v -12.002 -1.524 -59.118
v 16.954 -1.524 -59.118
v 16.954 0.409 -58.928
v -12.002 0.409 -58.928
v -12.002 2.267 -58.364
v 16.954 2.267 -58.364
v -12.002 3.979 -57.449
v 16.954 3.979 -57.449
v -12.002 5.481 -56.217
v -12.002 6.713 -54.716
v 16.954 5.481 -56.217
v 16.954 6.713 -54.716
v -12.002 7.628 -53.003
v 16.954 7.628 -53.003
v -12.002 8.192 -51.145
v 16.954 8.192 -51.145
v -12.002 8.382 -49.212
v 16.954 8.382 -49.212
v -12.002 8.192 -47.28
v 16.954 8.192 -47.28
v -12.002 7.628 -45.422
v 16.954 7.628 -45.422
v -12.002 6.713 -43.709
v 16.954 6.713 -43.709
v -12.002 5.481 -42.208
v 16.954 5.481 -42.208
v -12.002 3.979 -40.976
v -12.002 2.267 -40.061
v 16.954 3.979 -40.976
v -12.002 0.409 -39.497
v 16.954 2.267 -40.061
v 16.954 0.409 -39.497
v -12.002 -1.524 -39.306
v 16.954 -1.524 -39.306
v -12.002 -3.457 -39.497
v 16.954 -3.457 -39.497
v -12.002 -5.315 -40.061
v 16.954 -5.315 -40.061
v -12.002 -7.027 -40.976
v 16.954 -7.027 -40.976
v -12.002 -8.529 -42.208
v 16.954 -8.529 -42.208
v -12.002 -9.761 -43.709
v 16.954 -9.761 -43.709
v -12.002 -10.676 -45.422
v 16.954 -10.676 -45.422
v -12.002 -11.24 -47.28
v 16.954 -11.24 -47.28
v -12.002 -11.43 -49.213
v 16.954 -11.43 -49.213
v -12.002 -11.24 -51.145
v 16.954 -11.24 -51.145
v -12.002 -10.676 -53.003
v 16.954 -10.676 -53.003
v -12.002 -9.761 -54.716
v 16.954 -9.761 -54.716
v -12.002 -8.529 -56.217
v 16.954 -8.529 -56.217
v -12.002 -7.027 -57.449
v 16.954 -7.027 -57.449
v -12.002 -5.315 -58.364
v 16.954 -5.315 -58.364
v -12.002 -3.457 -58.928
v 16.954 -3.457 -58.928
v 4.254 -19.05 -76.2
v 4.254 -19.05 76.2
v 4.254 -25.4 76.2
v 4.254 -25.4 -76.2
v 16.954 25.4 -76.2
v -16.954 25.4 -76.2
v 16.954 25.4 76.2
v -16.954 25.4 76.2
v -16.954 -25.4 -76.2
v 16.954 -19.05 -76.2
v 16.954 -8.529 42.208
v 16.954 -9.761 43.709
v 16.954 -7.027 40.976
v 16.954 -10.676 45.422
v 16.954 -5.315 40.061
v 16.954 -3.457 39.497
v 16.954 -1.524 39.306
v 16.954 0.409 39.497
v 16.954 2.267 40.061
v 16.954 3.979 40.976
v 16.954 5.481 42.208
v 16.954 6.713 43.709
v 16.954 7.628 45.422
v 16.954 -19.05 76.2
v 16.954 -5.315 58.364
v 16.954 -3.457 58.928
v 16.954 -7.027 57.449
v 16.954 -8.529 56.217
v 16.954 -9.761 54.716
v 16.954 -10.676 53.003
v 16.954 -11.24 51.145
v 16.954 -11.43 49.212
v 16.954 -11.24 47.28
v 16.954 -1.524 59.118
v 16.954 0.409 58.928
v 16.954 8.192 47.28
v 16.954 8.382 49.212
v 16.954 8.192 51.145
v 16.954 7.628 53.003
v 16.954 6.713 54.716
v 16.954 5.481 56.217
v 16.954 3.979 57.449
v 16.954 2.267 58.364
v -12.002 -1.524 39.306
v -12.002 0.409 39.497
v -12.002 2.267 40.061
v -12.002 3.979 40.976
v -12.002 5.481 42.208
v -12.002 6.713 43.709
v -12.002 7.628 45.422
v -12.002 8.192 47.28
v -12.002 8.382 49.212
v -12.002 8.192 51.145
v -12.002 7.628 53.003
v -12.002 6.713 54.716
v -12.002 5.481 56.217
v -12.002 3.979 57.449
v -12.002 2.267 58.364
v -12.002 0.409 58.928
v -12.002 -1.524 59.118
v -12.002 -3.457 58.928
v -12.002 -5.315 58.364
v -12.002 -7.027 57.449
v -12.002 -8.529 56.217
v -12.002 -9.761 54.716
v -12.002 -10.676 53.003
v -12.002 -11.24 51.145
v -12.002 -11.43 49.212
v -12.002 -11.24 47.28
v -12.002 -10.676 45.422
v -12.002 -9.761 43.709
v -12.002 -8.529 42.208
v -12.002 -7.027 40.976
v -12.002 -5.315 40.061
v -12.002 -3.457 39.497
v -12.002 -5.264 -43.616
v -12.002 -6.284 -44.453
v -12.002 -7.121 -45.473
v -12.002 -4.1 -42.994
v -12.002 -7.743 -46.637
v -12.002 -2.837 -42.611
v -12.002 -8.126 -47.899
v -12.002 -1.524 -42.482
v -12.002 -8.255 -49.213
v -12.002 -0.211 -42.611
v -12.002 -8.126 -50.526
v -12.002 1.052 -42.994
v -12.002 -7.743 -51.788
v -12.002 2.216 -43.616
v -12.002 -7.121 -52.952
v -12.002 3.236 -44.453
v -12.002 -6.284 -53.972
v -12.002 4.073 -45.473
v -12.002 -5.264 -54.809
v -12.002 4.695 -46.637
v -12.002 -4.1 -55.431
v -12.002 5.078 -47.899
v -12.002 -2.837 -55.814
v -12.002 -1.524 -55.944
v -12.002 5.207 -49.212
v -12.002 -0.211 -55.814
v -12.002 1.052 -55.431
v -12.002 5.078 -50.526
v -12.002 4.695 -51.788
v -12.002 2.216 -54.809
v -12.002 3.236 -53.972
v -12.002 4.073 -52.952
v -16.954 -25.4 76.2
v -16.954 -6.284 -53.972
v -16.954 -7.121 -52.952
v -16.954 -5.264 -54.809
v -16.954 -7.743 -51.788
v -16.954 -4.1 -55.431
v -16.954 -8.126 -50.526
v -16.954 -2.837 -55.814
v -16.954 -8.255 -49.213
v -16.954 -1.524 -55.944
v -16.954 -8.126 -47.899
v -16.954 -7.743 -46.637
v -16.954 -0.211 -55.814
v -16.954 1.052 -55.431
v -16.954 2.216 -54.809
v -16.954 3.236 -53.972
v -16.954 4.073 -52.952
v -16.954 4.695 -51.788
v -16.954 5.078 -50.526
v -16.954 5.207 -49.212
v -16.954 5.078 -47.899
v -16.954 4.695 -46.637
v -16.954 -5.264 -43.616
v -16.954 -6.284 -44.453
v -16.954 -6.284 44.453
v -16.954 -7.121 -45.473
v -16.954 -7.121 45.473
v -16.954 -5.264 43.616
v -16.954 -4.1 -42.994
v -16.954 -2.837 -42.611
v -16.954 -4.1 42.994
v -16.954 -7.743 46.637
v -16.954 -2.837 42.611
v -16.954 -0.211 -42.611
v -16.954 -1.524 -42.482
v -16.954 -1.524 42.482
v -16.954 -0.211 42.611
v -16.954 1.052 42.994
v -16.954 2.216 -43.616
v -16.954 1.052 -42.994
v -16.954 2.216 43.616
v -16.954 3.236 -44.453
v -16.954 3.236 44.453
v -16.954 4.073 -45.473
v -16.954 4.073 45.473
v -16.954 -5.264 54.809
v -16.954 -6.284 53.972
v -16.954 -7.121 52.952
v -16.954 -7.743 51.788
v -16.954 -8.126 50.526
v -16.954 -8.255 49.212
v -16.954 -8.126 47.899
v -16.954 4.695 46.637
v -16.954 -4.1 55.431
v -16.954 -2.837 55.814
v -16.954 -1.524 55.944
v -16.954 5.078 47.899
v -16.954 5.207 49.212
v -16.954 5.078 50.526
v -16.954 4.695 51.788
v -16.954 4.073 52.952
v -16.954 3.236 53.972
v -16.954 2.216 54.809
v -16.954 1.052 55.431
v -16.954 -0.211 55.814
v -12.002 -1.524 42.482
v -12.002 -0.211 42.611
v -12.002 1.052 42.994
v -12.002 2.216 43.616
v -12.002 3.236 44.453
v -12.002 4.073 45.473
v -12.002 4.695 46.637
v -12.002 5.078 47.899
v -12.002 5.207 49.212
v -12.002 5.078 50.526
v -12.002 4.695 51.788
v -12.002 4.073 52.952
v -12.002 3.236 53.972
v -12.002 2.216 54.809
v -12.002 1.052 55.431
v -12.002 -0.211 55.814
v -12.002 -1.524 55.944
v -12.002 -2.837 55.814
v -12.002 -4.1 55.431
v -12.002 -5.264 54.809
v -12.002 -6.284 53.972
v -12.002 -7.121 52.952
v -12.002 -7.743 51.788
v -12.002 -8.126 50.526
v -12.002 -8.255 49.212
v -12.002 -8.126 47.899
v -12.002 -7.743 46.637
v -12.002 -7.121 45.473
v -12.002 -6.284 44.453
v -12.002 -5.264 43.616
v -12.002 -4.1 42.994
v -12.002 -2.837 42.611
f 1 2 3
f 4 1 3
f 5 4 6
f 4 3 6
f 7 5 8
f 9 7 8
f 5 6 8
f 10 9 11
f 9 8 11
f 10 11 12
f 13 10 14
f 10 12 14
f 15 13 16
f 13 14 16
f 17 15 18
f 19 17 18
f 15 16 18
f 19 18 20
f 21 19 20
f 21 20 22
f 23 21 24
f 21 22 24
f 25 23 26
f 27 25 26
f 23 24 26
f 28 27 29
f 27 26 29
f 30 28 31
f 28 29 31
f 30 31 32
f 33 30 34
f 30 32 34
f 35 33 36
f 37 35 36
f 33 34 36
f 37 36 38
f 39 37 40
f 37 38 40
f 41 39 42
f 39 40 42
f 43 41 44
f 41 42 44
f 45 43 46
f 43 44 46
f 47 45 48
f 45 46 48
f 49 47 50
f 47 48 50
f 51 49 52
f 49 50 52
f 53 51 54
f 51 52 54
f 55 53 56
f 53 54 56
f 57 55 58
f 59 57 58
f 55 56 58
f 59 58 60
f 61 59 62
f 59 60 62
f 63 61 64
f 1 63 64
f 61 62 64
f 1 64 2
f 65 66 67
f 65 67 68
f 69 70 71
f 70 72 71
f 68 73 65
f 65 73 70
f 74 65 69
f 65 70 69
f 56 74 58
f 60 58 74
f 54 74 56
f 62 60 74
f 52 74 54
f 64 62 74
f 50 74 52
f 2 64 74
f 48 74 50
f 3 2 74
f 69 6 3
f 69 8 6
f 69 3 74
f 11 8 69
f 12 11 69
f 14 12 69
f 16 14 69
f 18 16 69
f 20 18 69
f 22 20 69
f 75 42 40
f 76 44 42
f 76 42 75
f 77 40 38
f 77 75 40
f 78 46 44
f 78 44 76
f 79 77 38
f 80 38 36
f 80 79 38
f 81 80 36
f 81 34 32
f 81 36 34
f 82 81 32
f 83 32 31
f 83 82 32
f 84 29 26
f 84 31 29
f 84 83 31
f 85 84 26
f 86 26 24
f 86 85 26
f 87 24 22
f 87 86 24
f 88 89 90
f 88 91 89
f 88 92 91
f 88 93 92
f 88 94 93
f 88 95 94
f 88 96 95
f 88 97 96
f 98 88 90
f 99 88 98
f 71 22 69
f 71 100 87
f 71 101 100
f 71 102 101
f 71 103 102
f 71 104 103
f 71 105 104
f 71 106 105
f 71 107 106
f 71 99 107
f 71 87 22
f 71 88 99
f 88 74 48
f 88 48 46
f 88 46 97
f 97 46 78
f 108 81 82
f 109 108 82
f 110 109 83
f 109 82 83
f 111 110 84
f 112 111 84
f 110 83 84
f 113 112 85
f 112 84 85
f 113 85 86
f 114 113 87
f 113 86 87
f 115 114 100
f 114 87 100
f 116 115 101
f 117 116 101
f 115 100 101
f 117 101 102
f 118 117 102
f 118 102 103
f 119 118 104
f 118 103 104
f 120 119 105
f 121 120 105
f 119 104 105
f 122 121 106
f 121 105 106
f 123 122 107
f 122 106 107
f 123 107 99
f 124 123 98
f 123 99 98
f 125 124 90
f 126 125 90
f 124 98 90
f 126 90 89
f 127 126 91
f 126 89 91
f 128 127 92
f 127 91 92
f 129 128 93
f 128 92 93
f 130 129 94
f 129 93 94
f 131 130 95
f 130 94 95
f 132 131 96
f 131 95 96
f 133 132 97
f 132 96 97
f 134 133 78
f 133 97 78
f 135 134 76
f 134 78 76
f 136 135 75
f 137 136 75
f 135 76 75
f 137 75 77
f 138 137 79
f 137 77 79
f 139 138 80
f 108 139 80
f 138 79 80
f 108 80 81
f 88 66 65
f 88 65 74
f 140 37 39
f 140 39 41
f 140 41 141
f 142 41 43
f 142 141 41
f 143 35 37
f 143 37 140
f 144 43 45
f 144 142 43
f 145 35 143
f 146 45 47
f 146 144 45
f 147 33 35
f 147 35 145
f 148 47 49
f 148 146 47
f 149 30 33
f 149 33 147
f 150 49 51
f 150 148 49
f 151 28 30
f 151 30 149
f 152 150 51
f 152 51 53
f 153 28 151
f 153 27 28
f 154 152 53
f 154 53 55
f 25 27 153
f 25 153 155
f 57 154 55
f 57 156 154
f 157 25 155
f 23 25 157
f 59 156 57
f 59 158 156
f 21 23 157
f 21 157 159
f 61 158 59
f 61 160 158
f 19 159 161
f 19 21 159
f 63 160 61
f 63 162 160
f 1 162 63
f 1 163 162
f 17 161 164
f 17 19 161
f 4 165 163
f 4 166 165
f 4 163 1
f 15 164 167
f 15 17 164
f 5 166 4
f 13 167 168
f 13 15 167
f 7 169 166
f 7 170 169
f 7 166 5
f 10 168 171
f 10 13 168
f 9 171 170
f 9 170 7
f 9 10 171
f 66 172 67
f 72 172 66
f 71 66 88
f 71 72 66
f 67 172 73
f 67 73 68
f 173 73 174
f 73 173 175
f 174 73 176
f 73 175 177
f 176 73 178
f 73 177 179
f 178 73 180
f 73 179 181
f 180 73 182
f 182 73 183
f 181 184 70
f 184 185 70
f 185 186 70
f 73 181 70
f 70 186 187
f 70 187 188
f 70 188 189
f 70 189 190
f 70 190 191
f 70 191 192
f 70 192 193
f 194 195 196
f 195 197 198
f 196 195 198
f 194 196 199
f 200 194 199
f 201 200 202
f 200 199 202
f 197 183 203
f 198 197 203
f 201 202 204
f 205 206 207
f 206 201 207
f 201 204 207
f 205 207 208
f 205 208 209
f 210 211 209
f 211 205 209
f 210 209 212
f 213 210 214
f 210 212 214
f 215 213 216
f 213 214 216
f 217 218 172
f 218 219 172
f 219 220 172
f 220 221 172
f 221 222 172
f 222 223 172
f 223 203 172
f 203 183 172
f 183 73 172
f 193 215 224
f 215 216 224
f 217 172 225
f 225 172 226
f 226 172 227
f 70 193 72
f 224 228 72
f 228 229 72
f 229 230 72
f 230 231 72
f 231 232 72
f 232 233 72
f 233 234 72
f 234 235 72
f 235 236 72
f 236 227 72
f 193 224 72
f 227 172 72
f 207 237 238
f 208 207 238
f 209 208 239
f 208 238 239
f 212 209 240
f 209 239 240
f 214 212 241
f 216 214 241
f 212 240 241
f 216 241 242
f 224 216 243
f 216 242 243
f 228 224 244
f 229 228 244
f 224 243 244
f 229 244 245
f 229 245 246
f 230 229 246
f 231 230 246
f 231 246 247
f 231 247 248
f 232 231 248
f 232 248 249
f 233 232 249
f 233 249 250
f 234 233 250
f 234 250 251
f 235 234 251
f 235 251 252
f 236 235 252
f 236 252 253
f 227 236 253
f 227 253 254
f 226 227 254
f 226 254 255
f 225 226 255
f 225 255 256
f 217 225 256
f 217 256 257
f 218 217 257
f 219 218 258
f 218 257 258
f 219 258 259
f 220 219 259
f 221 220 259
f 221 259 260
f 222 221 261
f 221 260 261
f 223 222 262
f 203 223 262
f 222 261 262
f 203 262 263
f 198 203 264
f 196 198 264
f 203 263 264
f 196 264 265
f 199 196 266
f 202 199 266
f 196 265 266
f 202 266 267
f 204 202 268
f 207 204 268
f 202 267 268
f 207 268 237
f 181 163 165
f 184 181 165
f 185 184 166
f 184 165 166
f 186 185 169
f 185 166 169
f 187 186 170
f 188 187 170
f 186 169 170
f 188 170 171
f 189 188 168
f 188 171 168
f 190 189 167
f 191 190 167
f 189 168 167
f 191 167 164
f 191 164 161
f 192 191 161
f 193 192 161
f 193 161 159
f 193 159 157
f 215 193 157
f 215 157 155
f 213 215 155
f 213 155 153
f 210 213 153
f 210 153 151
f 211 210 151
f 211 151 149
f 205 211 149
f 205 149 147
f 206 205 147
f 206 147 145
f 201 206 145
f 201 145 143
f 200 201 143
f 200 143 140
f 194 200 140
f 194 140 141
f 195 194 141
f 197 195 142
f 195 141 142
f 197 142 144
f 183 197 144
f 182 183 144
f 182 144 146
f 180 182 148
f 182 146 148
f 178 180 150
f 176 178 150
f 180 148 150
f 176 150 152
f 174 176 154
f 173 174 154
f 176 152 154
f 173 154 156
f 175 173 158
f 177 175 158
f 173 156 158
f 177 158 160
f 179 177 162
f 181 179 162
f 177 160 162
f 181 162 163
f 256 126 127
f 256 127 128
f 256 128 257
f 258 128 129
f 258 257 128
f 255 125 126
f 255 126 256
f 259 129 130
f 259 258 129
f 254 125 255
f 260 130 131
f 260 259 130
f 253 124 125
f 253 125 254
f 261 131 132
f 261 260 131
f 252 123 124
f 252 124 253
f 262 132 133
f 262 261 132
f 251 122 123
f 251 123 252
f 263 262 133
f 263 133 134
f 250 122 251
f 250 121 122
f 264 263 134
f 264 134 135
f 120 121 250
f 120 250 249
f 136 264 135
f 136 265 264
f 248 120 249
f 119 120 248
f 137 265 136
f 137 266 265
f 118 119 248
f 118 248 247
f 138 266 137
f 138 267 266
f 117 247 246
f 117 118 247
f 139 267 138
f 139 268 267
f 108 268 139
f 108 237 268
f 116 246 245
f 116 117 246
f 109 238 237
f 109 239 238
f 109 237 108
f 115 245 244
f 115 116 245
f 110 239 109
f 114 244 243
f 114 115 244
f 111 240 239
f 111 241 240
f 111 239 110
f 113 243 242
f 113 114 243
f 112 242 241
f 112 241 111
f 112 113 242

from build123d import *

# Parameters (mm, degrees)
SKETCH1_W           = 33.909
SKETCH1_H           = 50.8
BOSS_EXTRUDE1_DEPTH = 76.2
CUT_EXTRUDE1_REACH  = 89.186
SKETCH2_R           = 6.731
SKETCH3_R           = 9.906
CUT_EXTRUDE2_DEPTH  = 28.956
SKETCH4_W           = 4.494494968
SKETCH4_H           = 6.35
CUT_EXTRUDE4_DEPTH  = 156.42964669
SKETCH5_W           = 152.4
SKETCH5_H           = 6.35
CUT_EXTRUDE5_DEPTH  = 12.7


with BuildPart() as part:
    # Sketch1 → Boss-Extrude1 (new, symmetric)
    with BuildSketch(Plane.XY):
        Rectangle(SKETCH1_W, SKETCH1_H)
    extrude(amount=BOSS_EXTRUDE1_DEPTH, both=True)

    # Sketch2 → Cut-Extrude1 (cut, up to next)
    with BuildSketch(Plane(origin=(16.9545, 0, 0), x_dir=(0, 0, -1), z_dir=(1, 0, 0)), mode=Mode.PRIVATE) as cut_extrude1_sk1:
        with Locations((-49.2125, -1.524)):
            Circle(SKETCH2_R)
    cut_extrude1_tool1 = extrude(cut_extrude1_sk1.sketch, amount=-CUT_EXTRUDE1_REACH, mode=Mode.PRIVATE) & part.part
    # Sketch2 → Cut-Extrude1 (cut, up to next)
    with BuildSketch(Plane(origin=(16.9545, 0, 0), x_dir=(0, 0, -1), z_dir=(1, 0, 0)), mode=Mode.PRIVATE) as cut_extrude1_sk2:
        with Locations((49.2125, -1.524)):
            Circle(SKETCH2_R)
    cut_extrude1_tool2 = extrude(cut_extrude1_sk2.sketch, amount=-CUT_EXTRUDE1_REACH, mode=Mode.PRIVATE) & part.part
    add(cut_extrude1_tool1.solids().sort_by_distance((16.9545, -1.524, 49.2125))[0], mode=Mode.SUBTRACT)
    add(cut_extrude1_tool2.solids().sort_by_distance((16.9545, -1.524, -49.2125))[0], mode=Mode.SUBTRACT)

    # Sketch3 → Cut-Extrude2 (cut)
    with BuildSketch(Plane(origin=(16.9545, 0, 0), x_dir=(0, 0, -1), z_dir=(1, 0, 0))):
        with Locations((-49.2125, -1.524)):
            Circle(SKETCH3_R)
        with Locations((49.2125, -1.524)):
            Circle(SKETCH3_R)
    extrude(amount=-CUT_EXTRUDE2_DEPTH, mode=Mode.SUBTRACT)

    # Sketch4 → Cut-Extrude4 (cut, through all)
    with BuildSketch(Plane.XY.offset(76.2)):
        with Locations((14.707252516, -22.225)):
            Rectangle(SKETCH4_W, SKETCH4_H)
    extrude(amount=-CUT_EXTRUDE4_DEPTH, mode=Mode.SUBTRACT)

    # Sketch5 → Cut-Extrude5 (cut)
    with BuildSketch(Plane(origin=(16.9545, 0, 0), x_dir=(0, 0, -1), z_dir=(1, 0, 0))):
        with Locations((0, -22.225)):
            Rectangle(SKETCH5_W, SKETCH5_H)
    extrude(amount=-CUT_EXTRUDE5_DEPTH, mode=Mode.SUBTRACT)


solid = part.part
